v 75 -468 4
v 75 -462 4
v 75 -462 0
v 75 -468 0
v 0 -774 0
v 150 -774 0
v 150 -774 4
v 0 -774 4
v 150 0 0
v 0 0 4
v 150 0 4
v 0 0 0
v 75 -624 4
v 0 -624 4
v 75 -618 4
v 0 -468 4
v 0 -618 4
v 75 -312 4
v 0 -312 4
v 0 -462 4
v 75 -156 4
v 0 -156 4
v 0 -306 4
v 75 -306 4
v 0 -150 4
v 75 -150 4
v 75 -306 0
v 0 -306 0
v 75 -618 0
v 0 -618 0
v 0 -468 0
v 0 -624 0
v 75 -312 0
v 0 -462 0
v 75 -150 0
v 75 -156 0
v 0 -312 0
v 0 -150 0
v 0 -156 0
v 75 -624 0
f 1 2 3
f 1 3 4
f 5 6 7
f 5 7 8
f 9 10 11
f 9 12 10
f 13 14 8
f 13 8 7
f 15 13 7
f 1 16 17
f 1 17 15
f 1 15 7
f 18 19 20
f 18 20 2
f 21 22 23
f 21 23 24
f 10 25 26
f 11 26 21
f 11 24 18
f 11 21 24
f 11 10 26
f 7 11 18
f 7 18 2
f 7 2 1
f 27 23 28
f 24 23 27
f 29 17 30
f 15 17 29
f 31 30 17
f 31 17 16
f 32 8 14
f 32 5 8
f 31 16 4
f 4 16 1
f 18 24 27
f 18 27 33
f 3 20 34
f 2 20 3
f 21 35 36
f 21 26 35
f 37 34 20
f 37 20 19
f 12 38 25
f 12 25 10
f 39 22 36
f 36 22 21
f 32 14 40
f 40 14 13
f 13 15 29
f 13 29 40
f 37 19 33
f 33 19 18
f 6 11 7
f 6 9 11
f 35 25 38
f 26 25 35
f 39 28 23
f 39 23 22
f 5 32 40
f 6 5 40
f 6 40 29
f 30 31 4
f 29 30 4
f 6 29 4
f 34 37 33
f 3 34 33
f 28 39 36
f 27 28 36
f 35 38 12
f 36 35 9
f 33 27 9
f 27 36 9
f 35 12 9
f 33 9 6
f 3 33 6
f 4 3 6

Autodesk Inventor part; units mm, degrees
ref_plane "YZ Plane" through (0, 0, 0) normal (1, 0, 0) x (0, 1, 0)
ref_plane "XZ Plane" through (0, 0, 0) normal (0, 1, 0) x (-1, 0, 0)
ref_plane "XY Plane" through (0, 0, 0) normal (0, 0, 1) x (1, 0, 0)
sketch "Sketch1" plane through (0, 0, 0) normal (0, 0, 1) x (1, 0, 0)
  line L0 (0, 0) -> (150, 0)
  line L1 (150, 0) -> (150, -774)
  line L2 (150, -774) -> (0, -774)
  line L3 (0, -774) -> (0, 0)
  dimension "d0" = 150
  dimension "d1" = 774
extrude "Extrusion1" add sketch "Sketch1" along normal blind 4
sketch "Sketch2" plane through (0, 0, 4) normal (0, 0, 1) x (1, 0, 0)
  line L0 (0, 0) -> (0, -774) projected
  line L1 (0, -150) -> (150, -150)
  line L2 (150, -774) -> (150, 0) projected
  line L3 (0, -156) -> (150, -156)
  line L4 (150, 0) -> (0, 0) projected
  line L5 (0, -306) -> (150, -306)
  line L6 (0, -312) -> (150, -312)
  line L7 (0, -462) -> (150, -462)
  line L8 (0, -468) -> (150, -468)
  line L9 (0, -618) -> (150, -618)
  line L10 (0, -624) -> (150, -624)
  line L11 (0, -774) -> (150, -774)
  line L12 (0, -780) -> (150, -780)
  line L13 (75, 0) -> (75, -774)
  line L14 (0, -774) -> (150, -774) projected
  line L15 (0, 0) -> (0, -774)
  point P0 (75, -306)
  point P1 (75, -618)
  point P2 (75, -156)
  point P3 (75, -150)
  point P4 (75, -312)
  point P5 (75, -306)
  point P6 (75, -468)
  point P7 (75, -462)
  point P8 (75, -624)
  point P9 (75, -618)
  point P10 (75, -780)
  point P11 (75, -774)
  dimension "d4" = 150
  dimension "d5" = 6
  dimension "d6" = 150
  dimension "d8" = 6
  dimension "d9" = 150
  dimension "d10" = 6
  dimension "d11" = 150
  dimension "d12" = 6
  dimension "d13" = 150
  dimension "d14" = 6
extrude "Extrusion2" cut sketch "Sketch2" against normal blind 6 contours L1 L13 L3 L0 | L5 L13 L6 L0 | L7 L13 L8 L0 | L9 L13 L10 L0
properties part number "Separador" material "Wood (Cherry)"
